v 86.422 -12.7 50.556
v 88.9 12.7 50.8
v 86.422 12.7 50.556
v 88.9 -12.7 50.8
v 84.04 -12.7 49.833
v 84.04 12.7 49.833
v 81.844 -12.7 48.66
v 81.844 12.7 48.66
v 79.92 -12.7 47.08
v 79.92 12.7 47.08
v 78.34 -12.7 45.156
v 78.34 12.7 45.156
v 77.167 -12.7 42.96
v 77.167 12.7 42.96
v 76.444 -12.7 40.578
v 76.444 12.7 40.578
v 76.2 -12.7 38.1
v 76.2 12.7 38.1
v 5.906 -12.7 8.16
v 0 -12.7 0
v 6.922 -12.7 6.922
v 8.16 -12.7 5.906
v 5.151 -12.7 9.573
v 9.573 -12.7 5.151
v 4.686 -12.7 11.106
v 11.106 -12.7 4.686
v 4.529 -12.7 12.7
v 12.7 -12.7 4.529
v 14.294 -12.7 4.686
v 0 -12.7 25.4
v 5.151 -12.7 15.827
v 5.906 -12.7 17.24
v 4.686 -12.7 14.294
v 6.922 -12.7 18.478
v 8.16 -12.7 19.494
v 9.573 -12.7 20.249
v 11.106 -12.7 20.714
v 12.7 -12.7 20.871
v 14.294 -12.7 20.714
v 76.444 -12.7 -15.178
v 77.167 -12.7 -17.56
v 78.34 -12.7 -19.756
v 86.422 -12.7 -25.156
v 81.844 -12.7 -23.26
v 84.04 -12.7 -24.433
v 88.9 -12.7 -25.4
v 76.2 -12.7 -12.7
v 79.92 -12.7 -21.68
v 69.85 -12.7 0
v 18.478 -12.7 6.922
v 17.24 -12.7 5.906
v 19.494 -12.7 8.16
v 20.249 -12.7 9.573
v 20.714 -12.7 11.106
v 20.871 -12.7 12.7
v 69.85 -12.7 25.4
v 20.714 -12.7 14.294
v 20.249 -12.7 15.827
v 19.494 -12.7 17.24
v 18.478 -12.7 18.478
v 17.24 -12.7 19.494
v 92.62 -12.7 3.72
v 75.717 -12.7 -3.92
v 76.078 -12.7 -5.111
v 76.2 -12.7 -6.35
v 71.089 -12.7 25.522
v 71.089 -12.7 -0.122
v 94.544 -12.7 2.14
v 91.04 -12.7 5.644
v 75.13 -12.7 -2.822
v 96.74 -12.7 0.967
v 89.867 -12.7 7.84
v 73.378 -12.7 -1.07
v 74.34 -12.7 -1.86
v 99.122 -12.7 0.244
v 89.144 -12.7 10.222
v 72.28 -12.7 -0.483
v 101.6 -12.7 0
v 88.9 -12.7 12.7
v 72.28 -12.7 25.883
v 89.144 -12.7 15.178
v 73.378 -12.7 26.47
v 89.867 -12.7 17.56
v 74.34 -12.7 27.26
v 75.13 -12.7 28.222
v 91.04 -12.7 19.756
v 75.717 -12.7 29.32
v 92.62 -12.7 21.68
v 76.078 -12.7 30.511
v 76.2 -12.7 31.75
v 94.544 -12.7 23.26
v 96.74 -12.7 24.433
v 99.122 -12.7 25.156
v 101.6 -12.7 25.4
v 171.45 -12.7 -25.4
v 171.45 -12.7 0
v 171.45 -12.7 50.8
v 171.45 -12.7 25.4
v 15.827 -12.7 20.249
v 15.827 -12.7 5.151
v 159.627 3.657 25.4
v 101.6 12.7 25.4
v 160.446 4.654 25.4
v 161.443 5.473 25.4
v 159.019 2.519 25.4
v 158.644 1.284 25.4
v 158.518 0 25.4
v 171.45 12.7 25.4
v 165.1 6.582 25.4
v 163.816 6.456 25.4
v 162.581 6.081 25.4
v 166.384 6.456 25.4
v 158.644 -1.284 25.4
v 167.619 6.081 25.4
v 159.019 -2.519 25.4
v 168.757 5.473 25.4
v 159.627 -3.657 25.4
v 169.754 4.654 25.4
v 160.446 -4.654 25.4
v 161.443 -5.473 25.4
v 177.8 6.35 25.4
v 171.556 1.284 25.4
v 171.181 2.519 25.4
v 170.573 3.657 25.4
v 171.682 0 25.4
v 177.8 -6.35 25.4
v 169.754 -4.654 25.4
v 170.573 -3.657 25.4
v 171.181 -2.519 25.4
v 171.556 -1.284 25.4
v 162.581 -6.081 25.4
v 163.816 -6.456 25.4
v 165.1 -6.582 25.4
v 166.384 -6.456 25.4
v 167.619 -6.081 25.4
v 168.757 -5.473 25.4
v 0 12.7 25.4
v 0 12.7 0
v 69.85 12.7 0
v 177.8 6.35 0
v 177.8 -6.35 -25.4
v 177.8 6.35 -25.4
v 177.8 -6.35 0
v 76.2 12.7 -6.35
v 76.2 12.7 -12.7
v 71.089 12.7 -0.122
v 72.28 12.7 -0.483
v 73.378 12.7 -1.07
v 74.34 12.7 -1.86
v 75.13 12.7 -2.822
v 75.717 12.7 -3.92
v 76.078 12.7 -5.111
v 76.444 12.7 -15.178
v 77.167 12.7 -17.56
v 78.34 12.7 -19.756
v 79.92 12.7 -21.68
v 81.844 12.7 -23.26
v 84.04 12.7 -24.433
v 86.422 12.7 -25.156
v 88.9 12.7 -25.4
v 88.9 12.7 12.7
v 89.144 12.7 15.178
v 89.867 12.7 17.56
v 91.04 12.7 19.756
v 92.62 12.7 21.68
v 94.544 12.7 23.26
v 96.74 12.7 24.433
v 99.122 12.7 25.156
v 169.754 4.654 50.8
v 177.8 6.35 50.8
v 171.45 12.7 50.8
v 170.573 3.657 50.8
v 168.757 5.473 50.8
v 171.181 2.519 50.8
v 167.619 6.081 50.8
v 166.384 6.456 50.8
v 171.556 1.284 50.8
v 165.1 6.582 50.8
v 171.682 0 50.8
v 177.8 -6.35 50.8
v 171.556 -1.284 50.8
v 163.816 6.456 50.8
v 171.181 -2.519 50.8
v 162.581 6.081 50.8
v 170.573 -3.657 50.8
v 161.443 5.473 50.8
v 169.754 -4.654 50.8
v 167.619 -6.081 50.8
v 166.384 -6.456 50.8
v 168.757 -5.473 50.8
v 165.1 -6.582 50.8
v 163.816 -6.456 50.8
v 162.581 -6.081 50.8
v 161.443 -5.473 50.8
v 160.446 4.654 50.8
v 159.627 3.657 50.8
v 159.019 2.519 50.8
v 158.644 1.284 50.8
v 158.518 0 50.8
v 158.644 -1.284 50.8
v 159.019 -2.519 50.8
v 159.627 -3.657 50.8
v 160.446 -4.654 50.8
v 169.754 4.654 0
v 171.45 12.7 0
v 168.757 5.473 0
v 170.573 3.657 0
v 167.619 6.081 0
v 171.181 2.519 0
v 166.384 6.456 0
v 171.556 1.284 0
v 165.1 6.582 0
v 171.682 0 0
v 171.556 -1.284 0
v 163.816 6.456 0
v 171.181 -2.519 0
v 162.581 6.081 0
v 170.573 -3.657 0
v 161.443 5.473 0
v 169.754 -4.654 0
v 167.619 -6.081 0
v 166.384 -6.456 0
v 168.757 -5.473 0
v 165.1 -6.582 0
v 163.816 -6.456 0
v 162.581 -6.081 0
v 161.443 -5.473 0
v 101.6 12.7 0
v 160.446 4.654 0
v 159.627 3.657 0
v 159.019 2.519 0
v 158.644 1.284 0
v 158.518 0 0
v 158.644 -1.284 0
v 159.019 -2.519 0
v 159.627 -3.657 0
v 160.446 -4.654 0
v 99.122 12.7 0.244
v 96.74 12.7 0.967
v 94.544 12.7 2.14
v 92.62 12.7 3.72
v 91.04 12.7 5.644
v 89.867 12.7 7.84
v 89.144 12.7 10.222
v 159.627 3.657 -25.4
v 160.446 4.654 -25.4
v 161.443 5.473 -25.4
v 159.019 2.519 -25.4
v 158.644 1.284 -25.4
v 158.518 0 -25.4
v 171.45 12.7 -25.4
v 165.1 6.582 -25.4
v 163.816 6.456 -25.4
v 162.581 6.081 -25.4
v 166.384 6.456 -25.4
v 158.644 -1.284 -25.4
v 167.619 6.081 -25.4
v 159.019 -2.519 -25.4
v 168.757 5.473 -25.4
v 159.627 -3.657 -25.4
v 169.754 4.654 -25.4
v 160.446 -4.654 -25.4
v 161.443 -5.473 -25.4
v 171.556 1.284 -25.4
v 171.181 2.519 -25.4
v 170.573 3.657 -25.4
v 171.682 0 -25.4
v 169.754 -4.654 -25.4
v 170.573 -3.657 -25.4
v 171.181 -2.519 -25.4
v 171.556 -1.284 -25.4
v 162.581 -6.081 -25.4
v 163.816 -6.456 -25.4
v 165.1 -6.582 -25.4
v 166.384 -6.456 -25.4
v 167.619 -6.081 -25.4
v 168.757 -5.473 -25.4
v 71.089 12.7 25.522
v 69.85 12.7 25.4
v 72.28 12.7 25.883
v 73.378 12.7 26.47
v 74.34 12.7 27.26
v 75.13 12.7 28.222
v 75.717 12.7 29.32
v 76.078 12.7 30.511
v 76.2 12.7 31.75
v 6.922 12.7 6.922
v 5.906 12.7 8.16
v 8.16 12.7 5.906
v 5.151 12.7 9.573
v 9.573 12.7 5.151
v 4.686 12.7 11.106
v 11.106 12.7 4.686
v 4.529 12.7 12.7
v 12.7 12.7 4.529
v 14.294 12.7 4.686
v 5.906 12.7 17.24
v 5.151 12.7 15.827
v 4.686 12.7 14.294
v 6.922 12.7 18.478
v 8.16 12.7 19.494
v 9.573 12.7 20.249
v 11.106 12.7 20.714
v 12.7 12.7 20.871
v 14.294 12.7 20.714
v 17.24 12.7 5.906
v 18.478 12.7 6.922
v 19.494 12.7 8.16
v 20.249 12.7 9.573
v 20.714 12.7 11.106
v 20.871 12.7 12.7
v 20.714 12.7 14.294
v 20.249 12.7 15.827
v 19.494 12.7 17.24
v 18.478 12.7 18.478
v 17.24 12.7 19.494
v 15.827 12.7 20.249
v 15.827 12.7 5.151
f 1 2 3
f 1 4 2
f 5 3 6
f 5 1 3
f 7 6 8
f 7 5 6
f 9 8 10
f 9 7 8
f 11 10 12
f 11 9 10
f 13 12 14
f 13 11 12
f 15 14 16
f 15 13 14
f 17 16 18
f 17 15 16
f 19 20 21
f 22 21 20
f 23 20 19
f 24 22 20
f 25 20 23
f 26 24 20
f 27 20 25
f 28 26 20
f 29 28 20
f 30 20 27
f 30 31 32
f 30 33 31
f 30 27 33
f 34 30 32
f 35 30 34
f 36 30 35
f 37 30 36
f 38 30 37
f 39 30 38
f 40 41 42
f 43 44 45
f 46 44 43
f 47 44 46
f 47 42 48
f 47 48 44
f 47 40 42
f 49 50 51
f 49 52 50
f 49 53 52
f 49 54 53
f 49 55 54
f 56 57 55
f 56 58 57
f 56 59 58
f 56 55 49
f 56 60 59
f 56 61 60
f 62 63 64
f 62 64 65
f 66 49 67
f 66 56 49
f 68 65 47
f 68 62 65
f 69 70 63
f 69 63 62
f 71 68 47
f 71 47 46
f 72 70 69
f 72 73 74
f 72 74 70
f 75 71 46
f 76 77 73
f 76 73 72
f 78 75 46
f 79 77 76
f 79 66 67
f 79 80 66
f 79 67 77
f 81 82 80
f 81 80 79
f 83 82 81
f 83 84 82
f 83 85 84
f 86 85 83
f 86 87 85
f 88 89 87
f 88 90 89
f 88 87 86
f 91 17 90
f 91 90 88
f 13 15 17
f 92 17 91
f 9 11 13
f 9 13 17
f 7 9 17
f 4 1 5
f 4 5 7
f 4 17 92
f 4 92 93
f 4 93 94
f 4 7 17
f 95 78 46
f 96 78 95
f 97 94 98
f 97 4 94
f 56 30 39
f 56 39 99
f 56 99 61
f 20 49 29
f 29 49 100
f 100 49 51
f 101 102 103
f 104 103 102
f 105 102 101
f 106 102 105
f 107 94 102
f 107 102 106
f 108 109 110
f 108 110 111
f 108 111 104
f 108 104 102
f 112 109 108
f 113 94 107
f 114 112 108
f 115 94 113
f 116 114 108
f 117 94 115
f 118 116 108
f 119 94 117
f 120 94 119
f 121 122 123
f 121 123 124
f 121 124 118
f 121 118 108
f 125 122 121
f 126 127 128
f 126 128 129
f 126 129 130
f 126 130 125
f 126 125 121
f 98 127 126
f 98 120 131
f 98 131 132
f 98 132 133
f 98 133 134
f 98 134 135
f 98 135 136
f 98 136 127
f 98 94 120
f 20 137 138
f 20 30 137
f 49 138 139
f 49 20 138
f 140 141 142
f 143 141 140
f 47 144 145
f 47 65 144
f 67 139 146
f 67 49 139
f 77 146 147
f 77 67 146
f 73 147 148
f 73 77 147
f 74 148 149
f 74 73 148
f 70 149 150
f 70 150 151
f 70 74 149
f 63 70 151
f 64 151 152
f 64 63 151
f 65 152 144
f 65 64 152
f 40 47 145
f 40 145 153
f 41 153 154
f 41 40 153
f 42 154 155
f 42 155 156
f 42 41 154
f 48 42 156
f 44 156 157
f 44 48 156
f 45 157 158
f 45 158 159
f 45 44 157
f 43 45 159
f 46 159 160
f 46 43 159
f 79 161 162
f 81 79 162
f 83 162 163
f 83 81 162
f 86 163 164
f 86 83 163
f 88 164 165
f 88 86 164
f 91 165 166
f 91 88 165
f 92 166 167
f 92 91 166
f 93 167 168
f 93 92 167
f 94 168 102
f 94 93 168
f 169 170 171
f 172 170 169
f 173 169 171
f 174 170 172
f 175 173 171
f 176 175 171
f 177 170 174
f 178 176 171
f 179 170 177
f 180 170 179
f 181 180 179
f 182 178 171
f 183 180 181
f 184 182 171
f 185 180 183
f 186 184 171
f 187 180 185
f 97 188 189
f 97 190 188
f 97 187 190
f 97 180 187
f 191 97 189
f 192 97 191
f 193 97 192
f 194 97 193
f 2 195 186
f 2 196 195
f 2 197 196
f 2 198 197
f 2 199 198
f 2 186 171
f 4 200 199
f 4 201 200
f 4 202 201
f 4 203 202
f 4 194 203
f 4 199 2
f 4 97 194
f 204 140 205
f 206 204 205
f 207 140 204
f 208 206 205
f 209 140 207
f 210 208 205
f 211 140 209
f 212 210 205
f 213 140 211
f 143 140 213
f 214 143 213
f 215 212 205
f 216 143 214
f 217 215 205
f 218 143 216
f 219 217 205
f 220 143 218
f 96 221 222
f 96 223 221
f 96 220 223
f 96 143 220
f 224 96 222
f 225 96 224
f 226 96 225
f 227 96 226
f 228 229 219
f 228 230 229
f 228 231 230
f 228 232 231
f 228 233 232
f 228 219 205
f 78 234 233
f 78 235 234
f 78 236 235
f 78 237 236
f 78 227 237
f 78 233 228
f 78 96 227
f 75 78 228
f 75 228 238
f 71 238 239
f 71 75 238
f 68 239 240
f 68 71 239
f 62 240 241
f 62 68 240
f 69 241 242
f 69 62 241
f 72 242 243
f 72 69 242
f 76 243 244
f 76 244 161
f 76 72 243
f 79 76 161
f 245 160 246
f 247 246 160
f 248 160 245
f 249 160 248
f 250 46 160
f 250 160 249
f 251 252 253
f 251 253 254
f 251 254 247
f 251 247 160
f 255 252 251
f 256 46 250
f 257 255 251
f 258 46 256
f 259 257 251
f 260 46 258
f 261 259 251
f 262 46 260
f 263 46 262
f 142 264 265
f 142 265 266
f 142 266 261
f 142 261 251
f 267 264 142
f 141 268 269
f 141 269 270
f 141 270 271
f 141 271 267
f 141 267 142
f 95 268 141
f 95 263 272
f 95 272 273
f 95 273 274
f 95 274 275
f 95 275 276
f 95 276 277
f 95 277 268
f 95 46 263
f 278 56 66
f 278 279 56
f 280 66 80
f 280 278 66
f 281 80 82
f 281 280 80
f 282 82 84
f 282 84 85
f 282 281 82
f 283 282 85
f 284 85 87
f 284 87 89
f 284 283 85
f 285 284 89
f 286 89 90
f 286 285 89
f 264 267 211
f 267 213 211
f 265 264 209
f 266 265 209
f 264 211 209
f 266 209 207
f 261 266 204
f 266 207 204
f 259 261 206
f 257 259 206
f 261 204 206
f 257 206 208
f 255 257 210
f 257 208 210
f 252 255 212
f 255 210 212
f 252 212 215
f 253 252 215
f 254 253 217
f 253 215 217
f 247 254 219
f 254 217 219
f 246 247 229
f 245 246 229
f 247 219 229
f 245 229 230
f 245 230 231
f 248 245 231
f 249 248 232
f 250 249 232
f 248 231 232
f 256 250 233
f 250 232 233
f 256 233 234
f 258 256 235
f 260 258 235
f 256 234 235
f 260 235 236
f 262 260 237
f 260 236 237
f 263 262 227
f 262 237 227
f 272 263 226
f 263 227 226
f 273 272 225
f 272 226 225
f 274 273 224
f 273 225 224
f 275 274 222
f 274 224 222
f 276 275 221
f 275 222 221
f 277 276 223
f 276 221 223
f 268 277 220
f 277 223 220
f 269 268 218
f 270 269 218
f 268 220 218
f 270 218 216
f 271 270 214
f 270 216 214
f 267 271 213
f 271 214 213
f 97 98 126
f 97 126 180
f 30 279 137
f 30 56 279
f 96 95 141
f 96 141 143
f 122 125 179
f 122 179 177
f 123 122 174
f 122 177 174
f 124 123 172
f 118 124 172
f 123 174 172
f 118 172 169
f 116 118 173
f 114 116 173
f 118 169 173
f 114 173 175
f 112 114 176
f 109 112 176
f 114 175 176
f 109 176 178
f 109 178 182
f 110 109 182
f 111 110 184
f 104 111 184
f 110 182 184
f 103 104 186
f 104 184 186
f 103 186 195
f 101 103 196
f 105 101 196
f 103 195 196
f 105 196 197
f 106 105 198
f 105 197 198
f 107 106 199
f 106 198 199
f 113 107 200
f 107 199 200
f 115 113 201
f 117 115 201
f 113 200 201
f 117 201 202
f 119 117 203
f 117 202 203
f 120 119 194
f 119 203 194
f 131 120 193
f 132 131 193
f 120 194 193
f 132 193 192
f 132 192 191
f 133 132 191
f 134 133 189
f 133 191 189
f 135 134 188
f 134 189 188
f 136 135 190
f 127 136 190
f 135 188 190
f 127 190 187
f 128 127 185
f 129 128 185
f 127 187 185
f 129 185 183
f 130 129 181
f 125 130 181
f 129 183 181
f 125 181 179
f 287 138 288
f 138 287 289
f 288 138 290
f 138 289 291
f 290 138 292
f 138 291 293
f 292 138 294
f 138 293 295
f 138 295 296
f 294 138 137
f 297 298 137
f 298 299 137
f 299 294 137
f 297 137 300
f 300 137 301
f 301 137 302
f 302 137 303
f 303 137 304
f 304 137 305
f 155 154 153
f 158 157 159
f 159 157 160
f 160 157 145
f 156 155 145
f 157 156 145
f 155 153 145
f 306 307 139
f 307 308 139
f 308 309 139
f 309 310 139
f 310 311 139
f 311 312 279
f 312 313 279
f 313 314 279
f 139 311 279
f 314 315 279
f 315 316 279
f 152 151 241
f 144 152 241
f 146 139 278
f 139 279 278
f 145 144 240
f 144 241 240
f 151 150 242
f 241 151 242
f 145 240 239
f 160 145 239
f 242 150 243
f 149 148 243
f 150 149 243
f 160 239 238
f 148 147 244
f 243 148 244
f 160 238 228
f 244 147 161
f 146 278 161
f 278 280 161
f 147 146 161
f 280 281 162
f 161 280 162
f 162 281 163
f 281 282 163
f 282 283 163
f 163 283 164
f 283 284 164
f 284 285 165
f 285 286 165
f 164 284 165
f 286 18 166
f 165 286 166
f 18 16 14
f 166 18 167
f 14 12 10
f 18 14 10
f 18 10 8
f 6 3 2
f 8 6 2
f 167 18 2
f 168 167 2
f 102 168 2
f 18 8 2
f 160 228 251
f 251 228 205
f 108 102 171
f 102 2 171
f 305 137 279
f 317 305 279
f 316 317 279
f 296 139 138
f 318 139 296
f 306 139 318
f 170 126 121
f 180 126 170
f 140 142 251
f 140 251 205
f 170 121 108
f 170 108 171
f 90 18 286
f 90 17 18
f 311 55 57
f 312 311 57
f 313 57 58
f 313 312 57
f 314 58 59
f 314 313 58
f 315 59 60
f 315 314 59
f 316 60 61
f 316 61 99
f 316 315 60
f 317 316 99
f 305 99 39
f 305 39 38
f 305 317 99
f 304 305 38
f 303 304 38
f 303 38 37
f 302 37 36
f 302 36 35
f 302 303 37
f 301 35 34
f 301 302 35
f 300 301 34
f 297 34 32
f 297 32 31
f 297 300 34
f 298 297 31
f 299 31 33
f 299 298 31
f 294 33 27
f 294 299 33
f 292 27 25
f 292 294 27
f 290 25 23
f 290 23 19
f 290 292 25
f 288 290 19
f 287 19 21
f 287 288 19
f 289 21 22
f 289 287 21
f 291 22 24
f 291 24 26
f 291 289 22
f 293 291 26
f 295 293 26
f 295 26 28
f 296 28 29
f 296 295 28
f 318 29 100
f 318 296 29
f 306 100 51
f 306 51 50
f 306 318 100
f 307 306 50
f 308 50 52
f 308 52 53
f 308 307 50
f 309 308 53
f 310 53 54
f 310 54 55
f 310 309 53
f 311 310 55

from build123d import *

# Parameters (mm, degrees)
F0_R     = 8.171292
F1_DEPTH = 12.7
F2_R     = 6.582327
F3_DEPTH = 127
F4_R     = 6.35
F5_SIZE  = 6.35


with BuildPart() as f1:
    # F0 (on Front) → F1 (new body, symmetric)
    with BuildSketch(Plane.XZ):
        with BuildLine():
            Line((0, 25.4), (0, 0))
            Line((0, 0), (76.2, 0))
            Line((76.2, 0), (76.2, -12.7))
            ThreePointArc((76.2, -12.7), (79.919744, -21.680256), (88.9, -25.4))
            Line((88.9, -25.4), (177.8, -25.4))
            Line((177.8, -25.4), (177.8, 0))
            Line((177.8, 0), (101.6, 0))
            ThreePointArc((101.6, 0), (92.619744, 3.719744), (88.9, 12.7))
            ThreePointArc((88.9, 12.7), (92.619744, 21.680256), (101.6, 25.4))
            Line((101.6, 25.4), (177.8, 25.4))
            Line((177.8, 25.4), (177.8, 50.8))
            Line((177.8, 50.8), (88.9, 50.8))
            ThreePointArc((88.9, 50.8), (79.919744, 47.080256), (76.2, 38.1))
            Line((76.2, 38.1), (76.2, 25.4))
            Line((76.2, 25.4), (0, 25.4))
        make_face()
        with Locations((12.7, 12.7)):
            Circle(F0_R, mode=Mode.SUBTRACT)
    extrude(amount=F1_DEPTH, both=True)

    # F2 (on face) → F3 (cut, symmetric)
    with BuildSketch(Plane.XY.offset(50.8)):
        with Locations((165.1, 0)):
            Circle(F2_R)
    extrude(amount=F3_DEPTH, both=True, mode=Mode.SUBTRACT)

    # F4
    f4_edges = [f1.edges().sort_by_distance(p)[0] for p in [
        (76.2, 0, 25.4),
        (76.2, 0, 0),
    ]]
    fillet(f4_edges, radius=F4_R)

    # F5
    f5_edges = [f1.edges().sort_by_distance(p)[0] for p in [
        (177.8, 12.7, 38.1),
        (177.8, -12.7, 38.1),
        (177.8, -12.7, -12.7),
        (177.8, 12.7, -12.7),
    ]]
    chamfer(f5_edges, length=F5_SIZE)


solid = f1.part
